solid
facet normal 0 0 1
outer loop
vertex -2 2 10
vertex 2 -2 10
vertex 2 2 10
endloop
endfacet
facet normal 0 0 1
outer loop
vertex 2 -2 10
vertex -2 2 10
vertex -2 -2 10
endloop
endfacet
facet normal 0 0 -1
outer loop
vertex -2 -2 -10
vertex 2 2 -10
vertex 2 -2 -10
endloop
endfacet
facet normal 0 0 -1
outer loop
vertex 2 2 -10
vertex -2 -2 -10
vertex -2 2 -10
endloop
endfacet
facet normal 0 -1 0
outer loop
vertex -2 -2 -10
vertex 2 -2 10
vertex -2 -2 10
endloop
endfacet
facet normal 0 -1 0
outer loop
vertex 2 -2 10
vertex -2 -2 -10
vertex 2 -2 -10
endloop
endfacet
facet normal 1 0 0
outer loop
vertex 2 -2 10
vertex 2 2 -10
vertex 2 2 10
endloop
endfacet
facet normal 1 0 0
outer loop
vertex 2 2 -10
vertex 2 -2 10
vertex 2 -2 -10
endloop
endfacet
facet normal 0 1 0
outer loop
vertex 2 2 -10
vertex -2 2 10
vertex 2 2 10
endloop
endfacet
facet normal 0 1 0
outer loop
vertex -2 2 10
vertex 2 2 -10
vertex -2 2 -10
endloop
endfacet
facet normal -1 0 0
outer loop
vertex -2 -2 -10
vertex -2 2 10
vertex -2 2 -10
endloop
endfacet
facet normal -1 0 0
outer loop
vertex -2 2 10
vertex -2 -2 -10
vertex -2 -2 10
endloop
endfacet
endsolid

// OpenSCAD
import("../../obj/far-out-ring.obj", center=true);
// reference for origin
cube([4,4,20], center = true);
